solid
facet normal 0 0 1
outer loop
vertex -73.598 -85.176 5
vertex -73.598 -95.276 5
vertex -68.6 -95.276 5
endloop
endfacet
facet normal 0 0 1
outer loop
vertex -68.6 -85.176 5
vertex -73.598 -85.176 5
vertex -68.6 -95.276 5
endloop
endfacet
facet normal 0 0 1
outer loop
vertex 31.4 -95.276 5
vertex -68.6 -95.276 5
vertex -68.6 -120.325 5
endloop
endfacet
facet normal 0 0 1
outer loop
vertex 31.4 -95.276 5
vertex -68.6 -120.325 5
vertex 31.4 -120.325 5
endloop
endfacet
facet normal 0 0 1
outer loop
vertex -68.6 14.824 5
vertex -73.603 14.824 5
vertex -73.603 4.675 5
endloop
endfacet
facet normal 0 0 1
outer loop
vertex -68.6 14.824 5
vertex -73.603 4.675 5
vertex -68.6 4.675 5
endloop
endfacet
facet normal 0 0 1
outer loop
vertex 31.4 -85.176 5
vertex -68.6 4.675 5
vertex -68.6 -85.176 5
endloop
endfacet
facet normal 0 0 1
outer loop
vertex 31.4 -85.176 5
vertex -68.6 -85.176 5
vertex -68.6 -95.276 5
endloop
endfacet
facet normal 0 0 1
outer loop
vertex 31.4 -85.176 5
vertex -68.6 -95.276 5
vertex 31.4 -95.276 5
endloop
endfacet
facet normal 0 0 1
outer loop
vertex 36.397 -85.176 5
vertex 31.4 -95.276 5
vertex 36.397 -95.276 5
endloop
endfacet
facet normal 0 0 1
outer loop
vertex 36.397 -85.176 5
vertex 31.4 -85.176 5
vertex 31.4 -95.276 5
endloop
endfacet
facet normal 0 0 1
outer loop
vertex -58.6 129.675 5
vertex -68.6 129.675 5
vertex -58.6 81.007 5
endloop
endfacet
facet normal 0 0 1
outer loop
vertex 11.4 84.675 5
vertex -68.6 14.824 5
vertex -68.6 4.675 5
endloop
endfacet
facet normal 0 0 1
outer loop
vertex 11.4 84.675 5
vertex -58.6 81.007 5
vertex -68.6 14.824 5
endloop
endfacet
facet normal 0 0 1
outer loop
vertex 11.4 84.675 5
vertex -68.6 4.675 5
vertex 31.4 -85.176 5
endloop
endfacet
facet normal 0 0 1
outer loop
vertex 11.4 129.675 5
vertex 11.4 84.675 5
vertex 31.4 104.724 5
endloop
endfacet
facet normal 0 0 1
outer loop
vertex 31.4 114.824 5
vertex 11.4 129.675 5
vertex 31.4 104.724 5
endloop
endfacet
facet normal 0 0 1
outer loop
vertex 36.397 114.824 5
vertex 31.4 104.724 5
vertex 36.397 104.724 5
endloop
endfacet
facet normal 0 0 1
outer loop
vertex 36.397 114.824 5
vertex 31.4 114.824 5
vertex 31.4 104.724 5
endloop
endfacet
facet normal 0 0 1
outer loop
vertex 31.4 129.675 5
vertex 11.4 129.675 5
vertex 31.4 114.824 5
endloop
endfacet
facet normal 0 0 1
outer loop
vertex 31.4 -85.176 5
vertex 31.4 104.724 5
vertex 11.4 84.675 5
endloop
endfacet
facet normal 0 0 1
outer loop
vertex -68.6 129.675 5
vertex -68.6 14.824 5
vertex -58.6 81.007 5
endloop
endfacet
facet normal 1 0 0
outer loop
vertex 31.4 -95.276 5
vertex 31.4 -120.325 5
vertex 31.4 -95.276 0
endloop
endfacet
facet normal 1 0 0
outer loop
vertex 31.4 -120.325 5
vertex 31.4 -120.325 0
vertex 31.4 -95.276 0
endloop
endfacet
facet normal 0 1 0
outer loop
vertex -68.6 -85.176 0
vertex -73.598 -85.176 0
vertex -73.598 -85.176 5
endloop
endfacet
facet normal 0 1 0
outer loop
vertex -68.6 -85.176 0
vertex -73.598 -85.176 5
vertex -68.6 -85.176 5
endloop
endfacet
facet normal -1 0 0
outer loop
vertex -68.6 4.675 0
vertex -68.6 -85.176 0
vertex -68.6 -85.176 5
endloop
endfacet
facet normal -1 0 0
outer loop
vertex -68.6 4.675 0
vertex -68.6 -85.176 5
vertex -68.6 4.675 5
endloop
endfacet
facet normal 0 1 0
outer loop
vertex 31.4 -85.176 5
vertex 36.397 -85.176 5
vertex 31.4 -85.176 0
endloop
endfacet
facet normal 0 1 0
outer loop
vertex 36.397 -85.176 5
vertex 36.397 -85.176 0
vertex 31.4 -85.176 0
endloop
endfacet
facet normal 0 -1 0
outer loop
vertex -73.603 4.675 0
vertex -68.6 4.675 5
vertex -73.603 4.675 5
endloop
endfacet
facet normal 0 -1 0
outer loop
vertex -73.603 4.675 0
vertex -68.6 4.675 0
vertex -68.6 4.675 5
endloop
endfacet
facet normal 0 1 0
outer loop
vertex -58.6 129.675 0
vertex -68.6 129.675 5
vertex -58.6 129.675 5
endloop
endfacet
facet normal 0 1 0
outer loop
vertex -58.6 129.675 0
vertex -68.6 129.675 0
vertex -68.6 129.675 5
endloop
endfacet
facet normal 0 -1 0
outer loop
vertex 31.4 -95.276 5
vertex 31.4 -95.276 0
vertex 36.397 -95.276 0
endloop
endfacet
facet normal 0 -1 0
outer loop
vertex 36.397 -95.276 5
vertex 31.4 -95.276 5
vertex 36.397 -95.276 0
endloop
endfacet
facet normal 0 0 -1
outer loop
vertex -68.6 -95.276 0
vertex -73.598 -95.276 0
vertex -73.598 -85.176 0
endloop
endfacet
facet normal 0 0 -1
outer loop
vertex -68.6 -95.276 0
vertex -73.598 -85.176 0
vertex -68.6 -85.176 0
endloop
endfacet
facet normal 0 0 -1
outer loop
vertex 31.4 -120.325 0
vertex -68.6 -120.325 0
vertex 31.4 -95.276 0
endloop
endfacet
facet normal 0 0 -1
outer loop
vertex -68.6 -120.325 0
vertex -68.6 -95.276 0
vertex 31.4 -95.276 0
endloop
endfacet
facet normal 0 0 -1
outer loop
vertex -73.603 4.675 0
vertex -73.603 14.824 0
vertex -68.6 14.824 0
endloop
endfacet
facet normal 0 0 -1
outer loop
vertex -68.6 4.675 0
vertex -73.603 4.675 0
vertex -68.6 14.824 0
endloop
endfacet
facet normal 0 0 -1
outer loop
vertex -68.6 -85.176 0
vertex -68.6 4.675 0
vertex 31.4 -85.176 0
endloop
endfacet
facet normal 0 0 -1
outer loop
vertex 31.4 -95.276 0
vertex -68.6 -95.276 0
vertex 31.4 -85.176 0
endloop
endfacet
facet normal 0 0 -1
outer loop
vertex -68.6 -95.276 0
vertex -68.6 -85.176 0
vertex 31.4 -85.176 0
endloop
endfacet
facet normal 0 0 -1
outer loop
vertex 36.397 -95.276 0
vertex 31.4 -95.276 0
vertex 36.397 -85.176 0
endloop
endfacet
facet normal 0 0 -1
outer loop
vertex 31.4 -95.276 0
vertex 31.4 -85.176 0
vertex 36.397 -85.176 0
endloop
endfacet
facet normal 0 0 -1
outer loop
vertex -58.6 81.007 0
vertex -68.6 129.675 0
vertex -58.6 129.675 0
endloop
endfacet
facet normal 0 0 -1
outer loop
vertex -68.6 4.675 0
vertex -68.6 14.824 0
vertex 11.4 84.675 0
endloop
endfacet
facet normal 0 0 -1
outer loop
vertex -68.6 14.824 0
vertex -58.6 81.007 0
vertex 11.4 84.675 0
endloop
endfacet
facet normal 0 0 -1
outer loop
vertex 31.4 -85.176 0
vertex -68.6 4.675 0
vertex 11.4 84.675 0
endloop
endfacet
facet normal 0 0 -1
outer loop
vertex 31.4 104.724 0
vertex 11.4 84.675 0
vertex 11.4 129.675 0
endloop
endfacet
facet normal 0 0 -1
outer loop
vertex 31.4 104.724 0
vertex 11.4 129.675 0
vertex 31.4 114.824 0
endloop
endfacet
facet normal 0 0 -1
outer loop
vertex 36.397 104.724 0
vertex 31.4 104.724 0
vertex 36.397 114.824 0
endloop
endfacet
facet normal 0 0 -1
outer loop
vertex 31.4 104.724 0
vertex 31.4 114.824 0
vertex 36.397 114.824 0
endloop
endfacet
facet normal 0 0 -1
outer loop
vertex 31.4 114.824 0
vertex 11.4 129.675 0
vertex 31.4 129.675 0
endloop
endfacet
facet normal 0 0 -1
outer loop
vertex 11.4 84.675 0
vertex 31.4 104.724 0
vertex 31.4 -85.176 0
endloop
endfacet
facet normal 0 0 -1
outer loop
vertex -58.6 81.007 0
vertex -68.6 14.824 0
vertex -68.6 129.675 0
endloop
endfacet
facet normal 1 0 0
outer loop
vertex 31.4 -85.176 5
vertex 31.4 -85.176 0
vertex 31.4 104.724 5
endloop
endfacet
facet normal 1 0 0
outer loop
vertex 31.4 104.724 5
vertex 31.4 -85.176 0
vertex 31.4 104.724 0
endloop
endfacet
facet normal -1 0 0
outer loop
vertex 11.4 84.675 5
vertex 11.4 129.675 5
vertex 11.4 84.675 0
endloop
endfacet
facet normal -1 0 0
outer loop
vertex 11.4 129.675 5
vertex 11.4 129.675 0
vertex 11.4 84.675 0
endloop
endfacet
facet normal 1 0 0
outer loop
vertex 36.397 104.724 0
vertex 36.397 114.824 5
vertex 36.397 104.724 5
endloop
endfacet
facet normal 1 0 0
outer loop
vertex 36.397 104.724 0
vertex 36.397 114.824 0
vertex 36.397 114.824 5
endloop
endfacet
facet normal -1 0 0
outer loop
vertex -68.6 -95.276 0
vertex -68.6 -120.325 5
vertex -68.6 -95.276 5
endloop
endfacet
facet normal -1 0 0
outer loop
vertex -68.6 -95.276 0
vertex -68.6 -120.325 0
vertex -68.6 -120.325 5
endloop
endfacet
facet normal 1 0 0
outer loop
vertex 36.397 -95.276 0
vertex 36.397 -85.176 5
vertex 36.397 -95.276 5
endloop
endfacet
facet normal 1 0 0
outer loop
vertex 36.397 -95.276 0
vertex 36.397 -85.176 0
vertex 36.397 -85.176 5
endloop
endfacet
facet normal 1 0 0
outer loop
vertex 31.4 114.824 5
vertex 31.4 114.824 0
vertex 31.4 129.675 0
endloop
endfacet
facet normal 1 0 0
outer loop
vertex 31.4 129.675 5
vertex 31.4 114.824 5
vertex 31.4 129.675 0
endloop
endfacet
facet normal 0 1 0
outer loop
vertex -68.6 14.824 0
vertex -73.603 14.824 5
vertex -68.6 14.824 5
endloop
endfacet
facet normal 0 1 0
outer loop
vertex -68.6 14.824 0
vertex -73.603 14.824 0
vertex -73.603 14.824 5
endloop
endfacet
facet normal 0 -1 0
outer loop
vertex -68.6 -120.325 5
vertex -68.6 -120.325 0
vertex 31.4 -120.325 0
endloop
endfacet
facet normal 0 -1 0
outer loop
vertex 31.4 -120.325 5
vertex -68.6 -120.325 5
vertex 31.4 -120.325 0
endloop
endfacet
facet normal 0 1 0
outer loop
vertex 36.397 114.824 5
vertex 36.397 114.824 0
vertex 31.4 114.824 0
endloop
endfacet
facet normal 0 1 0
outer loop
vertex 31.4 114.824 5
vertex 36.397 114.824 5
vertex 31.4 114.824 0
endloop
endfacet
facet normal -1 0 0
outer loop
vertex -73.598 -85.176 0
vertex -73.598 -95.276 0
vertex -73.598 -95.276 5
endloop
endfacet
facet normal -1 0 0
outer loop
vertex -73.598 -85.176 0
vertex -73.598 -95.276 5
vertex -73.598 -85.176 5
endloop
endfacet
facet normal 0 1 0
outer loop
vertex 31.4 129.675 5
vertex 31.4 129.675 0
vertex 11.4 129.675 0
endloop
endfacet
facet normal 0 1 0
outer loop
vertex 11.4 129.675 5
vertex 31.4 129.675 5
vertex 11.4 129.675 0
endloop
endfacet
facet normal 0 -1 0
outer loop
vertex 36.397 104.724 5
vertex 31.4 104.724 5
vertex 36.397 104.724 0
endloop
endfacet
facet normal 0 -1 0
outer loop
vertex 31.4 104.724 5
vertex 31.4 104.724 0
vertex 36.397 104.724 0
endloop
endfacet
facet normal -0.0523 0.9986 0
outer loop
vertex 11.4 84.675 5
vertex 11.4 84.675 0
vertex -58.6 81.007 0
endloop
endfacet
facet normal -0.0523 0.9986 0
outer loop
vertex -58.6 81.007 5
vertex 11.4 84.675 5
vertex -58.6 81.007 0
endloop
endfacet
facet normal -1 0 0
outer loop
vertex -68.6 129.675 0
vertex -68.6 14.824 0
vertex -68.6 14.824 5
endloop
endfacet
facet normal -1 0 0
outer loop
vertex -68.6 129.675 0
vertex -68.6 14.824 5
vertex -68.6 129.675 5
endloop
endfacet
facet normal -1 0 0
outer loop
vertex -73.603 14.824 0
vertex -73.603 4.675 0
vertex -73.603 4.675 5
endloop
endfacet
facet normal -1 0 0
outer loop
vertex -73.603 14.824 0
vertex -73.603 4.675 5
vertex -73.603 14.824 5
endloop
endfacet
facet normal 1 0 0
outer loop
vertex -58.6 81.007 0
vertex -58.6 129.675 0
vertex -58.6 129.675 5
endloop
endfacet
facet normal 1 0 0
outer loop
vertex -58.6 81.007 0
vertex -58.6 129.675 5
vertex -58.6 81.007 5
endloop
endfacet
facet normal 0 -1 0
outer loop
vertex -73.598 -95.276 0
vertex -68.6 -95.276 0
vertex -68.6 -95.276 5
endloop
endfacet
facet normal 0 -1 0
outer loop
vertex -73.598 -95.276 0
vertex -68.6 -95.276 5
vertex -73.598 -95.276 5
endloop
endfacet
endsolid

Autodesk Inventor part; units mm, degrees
ref_plane "YZ Plane" through (0, 0, 0) normal (1, 0, 0) x (0, 1, 0)
ref_plane "XZ Plane" through (0, 0, 0) normal (0, 1, 0) x (-1, 0, 0)
ref_plane "XY Plane" through (0, 0, 0) normal (0, 0, 1) x (1, 0, 0)
sketch "Sketch1" plane through (0, 0, 0) normal (0, 0, 1) x (1, 0, 0)
  line L0 (-68.6002, -120.3249) -> (31.3998, -120.3249)
  line L1 (31.3998, -120.3249) -> (31.3998, 129.6751)
  line L2 (31.3998, 129.6751) -> (11.3998, 129.6751)
  line L3 (11.3998, 129.6751) -> (11.3998, 84.6751)
  line L4 (11.3998, 84.6751) -> (-58.6002, 81.0066)
  line L5 (-68.6002, -120.3249) -> (-68.6002, 77.725)
  line L6 (-68.6002, 77.725) -> (-68.6002, 129.6751)
  line L7 (-68.6002, 129.6751) -> (-58.6002, 129.6751)
  line L8 (-58.6002, 129.6751) -> (-58.6002, 81.0066)
  line L9 (31.3998, -120.3249) -> (41.3973, -120.3249) construction
  line L10 (31.3998, 4.6751) -> (-68.6002, 4.6751) construction
  line L11 (31.3998, 4.6751) -> (36.4024, 4.6751)
  line L12 (36.4024, 14.8241) -> (31.3973, 14.8241)
  line L13 (31.3973, 14.8241) -> (31.3998, 4.6751)
  line L14 (-68.6002, 129.6751) -> (-68.6002, 79.6751)
  line L15 (-68.6002, 79.6751) -> (31.3998, 79.6751) construction
  line L16 (36.3973, 114.8241) -> (31.3973, 114.8241)
  line L17 (31.3973, 104.7241) -> (36.3973, 104.7241)
  line L18 (36.3973, -85.1759) -> (31.3973, -85.1759)
  line L19 (31.3973, -95.2759) -> (36.3973, -95.2759)
  line L20 (36.4024, 14.8241) -> (31.4024, 14.8241)
  line L21 (31.4024, 4.7241) -> (36.4024, 4.7241)
  line L22 (-18.6002, -120.3249) -> (-18.6002, 129.7241) construction
  line L23 (-73.6027, 14.8241) -> (-68.5976, 14.8241)
  line L24 (-73.6027, 14.8241) -> (-68.6027, 14.8241)
  line L25 (-68.6002, 4.6751) -> (-73.6027, 4.6751)
  line L26 (-68.6027, 4.7241) -> (-73.6027, 4.7241)
  line L27 (-73.6027, 4.6751) -> (-73.6027, 14.8241)
  line L28 (-73.6027, 4.7241) -> (-73.6027, 14.8241)
  line L29 (-73.5976, -85.1759) -> (-68.5976, -85.1759)
  line L30 (-73.5976, -95.2759) -> (-73.5976, -85.1759)
  line L31 (-68.5976, -95.2759) -> (-73.5976, -95.2759)
  line L32 (-68.6002, -120.3249) -> (-78.6002, -120.3249)
  line L33 (-58.6002, 81.0066) -> (-68.6002, 81.0556) construction
  line L34 (36.4024, 14.8241) -> (36.4024, 4.7241)
  line L35 (36.3973, 114.8241) -> (36.3973, 104.7241)
  line L36 (36.3973, -85.1759) -> (36.3973, -95.2759)
  line L37 (11.2345, 78.6582) -> (0.2496, 78.0825)
  line L38 (0.2496, 78.0825) -> (-0.0644, 84.0743)
  line L39 (-0.0644, 84.0743) -> (10.9205, 84.65)
  line L40 (10.9205, 84.65) -> (11.2345, 78.6582)
  line L41 (-57.9849, 81.0388) -> (10.9205, 84.65)
  line L42 (-57.6709, 75.047) -> (-57.9849, 81.0388)
  line L43 (-46.686, 75.6227) -> (-57.6709, 75.047)
  line L44 (-47, 81.6145) -> (-46.686, 75.6227)
  point P0 (0, 0)
  point P1 (21.3998, 129.6751)
  point P2 (-63.6002, 129.6751)
  point P3 (-68.6002, 14.8241)
  point P4 (-68.6002, 4.6751)
  point P5 (-68.6002, -85.1759)
  point P6 (-68.6002, -95.2759)
  point P7 (31.3998, -95.2759)
  point P8 (31.3998, -85.1759)
  point P9 (36.3973, 4.7241)
  point P10 (36.4024, 14.8241)
  point P11 (31.3998, 14.8241)
  point P12 (31.3998, 104.7241)
  point P13 (31.3998, 114.8241)
  dimension "d0" = 100
  dimension "d2" = 20
  dimension "d4" = 93
  dimension "d5" = 10
  dimension "d6" = 85
  dimension "d10" = 50
  dimension "d12" = 100
  dimension "d13" = 10
  dimension "d33" = 11
  dimension "d34" = 6
  dimension "d35" = 10
  dimension "d36" = 11
  dimension "d37" = 6
  dimension "d43" = 0
extrude "Extrusion1" add sketch "Sketch1" along normal blind 5
properties part number "Lifting Sections leftt"
